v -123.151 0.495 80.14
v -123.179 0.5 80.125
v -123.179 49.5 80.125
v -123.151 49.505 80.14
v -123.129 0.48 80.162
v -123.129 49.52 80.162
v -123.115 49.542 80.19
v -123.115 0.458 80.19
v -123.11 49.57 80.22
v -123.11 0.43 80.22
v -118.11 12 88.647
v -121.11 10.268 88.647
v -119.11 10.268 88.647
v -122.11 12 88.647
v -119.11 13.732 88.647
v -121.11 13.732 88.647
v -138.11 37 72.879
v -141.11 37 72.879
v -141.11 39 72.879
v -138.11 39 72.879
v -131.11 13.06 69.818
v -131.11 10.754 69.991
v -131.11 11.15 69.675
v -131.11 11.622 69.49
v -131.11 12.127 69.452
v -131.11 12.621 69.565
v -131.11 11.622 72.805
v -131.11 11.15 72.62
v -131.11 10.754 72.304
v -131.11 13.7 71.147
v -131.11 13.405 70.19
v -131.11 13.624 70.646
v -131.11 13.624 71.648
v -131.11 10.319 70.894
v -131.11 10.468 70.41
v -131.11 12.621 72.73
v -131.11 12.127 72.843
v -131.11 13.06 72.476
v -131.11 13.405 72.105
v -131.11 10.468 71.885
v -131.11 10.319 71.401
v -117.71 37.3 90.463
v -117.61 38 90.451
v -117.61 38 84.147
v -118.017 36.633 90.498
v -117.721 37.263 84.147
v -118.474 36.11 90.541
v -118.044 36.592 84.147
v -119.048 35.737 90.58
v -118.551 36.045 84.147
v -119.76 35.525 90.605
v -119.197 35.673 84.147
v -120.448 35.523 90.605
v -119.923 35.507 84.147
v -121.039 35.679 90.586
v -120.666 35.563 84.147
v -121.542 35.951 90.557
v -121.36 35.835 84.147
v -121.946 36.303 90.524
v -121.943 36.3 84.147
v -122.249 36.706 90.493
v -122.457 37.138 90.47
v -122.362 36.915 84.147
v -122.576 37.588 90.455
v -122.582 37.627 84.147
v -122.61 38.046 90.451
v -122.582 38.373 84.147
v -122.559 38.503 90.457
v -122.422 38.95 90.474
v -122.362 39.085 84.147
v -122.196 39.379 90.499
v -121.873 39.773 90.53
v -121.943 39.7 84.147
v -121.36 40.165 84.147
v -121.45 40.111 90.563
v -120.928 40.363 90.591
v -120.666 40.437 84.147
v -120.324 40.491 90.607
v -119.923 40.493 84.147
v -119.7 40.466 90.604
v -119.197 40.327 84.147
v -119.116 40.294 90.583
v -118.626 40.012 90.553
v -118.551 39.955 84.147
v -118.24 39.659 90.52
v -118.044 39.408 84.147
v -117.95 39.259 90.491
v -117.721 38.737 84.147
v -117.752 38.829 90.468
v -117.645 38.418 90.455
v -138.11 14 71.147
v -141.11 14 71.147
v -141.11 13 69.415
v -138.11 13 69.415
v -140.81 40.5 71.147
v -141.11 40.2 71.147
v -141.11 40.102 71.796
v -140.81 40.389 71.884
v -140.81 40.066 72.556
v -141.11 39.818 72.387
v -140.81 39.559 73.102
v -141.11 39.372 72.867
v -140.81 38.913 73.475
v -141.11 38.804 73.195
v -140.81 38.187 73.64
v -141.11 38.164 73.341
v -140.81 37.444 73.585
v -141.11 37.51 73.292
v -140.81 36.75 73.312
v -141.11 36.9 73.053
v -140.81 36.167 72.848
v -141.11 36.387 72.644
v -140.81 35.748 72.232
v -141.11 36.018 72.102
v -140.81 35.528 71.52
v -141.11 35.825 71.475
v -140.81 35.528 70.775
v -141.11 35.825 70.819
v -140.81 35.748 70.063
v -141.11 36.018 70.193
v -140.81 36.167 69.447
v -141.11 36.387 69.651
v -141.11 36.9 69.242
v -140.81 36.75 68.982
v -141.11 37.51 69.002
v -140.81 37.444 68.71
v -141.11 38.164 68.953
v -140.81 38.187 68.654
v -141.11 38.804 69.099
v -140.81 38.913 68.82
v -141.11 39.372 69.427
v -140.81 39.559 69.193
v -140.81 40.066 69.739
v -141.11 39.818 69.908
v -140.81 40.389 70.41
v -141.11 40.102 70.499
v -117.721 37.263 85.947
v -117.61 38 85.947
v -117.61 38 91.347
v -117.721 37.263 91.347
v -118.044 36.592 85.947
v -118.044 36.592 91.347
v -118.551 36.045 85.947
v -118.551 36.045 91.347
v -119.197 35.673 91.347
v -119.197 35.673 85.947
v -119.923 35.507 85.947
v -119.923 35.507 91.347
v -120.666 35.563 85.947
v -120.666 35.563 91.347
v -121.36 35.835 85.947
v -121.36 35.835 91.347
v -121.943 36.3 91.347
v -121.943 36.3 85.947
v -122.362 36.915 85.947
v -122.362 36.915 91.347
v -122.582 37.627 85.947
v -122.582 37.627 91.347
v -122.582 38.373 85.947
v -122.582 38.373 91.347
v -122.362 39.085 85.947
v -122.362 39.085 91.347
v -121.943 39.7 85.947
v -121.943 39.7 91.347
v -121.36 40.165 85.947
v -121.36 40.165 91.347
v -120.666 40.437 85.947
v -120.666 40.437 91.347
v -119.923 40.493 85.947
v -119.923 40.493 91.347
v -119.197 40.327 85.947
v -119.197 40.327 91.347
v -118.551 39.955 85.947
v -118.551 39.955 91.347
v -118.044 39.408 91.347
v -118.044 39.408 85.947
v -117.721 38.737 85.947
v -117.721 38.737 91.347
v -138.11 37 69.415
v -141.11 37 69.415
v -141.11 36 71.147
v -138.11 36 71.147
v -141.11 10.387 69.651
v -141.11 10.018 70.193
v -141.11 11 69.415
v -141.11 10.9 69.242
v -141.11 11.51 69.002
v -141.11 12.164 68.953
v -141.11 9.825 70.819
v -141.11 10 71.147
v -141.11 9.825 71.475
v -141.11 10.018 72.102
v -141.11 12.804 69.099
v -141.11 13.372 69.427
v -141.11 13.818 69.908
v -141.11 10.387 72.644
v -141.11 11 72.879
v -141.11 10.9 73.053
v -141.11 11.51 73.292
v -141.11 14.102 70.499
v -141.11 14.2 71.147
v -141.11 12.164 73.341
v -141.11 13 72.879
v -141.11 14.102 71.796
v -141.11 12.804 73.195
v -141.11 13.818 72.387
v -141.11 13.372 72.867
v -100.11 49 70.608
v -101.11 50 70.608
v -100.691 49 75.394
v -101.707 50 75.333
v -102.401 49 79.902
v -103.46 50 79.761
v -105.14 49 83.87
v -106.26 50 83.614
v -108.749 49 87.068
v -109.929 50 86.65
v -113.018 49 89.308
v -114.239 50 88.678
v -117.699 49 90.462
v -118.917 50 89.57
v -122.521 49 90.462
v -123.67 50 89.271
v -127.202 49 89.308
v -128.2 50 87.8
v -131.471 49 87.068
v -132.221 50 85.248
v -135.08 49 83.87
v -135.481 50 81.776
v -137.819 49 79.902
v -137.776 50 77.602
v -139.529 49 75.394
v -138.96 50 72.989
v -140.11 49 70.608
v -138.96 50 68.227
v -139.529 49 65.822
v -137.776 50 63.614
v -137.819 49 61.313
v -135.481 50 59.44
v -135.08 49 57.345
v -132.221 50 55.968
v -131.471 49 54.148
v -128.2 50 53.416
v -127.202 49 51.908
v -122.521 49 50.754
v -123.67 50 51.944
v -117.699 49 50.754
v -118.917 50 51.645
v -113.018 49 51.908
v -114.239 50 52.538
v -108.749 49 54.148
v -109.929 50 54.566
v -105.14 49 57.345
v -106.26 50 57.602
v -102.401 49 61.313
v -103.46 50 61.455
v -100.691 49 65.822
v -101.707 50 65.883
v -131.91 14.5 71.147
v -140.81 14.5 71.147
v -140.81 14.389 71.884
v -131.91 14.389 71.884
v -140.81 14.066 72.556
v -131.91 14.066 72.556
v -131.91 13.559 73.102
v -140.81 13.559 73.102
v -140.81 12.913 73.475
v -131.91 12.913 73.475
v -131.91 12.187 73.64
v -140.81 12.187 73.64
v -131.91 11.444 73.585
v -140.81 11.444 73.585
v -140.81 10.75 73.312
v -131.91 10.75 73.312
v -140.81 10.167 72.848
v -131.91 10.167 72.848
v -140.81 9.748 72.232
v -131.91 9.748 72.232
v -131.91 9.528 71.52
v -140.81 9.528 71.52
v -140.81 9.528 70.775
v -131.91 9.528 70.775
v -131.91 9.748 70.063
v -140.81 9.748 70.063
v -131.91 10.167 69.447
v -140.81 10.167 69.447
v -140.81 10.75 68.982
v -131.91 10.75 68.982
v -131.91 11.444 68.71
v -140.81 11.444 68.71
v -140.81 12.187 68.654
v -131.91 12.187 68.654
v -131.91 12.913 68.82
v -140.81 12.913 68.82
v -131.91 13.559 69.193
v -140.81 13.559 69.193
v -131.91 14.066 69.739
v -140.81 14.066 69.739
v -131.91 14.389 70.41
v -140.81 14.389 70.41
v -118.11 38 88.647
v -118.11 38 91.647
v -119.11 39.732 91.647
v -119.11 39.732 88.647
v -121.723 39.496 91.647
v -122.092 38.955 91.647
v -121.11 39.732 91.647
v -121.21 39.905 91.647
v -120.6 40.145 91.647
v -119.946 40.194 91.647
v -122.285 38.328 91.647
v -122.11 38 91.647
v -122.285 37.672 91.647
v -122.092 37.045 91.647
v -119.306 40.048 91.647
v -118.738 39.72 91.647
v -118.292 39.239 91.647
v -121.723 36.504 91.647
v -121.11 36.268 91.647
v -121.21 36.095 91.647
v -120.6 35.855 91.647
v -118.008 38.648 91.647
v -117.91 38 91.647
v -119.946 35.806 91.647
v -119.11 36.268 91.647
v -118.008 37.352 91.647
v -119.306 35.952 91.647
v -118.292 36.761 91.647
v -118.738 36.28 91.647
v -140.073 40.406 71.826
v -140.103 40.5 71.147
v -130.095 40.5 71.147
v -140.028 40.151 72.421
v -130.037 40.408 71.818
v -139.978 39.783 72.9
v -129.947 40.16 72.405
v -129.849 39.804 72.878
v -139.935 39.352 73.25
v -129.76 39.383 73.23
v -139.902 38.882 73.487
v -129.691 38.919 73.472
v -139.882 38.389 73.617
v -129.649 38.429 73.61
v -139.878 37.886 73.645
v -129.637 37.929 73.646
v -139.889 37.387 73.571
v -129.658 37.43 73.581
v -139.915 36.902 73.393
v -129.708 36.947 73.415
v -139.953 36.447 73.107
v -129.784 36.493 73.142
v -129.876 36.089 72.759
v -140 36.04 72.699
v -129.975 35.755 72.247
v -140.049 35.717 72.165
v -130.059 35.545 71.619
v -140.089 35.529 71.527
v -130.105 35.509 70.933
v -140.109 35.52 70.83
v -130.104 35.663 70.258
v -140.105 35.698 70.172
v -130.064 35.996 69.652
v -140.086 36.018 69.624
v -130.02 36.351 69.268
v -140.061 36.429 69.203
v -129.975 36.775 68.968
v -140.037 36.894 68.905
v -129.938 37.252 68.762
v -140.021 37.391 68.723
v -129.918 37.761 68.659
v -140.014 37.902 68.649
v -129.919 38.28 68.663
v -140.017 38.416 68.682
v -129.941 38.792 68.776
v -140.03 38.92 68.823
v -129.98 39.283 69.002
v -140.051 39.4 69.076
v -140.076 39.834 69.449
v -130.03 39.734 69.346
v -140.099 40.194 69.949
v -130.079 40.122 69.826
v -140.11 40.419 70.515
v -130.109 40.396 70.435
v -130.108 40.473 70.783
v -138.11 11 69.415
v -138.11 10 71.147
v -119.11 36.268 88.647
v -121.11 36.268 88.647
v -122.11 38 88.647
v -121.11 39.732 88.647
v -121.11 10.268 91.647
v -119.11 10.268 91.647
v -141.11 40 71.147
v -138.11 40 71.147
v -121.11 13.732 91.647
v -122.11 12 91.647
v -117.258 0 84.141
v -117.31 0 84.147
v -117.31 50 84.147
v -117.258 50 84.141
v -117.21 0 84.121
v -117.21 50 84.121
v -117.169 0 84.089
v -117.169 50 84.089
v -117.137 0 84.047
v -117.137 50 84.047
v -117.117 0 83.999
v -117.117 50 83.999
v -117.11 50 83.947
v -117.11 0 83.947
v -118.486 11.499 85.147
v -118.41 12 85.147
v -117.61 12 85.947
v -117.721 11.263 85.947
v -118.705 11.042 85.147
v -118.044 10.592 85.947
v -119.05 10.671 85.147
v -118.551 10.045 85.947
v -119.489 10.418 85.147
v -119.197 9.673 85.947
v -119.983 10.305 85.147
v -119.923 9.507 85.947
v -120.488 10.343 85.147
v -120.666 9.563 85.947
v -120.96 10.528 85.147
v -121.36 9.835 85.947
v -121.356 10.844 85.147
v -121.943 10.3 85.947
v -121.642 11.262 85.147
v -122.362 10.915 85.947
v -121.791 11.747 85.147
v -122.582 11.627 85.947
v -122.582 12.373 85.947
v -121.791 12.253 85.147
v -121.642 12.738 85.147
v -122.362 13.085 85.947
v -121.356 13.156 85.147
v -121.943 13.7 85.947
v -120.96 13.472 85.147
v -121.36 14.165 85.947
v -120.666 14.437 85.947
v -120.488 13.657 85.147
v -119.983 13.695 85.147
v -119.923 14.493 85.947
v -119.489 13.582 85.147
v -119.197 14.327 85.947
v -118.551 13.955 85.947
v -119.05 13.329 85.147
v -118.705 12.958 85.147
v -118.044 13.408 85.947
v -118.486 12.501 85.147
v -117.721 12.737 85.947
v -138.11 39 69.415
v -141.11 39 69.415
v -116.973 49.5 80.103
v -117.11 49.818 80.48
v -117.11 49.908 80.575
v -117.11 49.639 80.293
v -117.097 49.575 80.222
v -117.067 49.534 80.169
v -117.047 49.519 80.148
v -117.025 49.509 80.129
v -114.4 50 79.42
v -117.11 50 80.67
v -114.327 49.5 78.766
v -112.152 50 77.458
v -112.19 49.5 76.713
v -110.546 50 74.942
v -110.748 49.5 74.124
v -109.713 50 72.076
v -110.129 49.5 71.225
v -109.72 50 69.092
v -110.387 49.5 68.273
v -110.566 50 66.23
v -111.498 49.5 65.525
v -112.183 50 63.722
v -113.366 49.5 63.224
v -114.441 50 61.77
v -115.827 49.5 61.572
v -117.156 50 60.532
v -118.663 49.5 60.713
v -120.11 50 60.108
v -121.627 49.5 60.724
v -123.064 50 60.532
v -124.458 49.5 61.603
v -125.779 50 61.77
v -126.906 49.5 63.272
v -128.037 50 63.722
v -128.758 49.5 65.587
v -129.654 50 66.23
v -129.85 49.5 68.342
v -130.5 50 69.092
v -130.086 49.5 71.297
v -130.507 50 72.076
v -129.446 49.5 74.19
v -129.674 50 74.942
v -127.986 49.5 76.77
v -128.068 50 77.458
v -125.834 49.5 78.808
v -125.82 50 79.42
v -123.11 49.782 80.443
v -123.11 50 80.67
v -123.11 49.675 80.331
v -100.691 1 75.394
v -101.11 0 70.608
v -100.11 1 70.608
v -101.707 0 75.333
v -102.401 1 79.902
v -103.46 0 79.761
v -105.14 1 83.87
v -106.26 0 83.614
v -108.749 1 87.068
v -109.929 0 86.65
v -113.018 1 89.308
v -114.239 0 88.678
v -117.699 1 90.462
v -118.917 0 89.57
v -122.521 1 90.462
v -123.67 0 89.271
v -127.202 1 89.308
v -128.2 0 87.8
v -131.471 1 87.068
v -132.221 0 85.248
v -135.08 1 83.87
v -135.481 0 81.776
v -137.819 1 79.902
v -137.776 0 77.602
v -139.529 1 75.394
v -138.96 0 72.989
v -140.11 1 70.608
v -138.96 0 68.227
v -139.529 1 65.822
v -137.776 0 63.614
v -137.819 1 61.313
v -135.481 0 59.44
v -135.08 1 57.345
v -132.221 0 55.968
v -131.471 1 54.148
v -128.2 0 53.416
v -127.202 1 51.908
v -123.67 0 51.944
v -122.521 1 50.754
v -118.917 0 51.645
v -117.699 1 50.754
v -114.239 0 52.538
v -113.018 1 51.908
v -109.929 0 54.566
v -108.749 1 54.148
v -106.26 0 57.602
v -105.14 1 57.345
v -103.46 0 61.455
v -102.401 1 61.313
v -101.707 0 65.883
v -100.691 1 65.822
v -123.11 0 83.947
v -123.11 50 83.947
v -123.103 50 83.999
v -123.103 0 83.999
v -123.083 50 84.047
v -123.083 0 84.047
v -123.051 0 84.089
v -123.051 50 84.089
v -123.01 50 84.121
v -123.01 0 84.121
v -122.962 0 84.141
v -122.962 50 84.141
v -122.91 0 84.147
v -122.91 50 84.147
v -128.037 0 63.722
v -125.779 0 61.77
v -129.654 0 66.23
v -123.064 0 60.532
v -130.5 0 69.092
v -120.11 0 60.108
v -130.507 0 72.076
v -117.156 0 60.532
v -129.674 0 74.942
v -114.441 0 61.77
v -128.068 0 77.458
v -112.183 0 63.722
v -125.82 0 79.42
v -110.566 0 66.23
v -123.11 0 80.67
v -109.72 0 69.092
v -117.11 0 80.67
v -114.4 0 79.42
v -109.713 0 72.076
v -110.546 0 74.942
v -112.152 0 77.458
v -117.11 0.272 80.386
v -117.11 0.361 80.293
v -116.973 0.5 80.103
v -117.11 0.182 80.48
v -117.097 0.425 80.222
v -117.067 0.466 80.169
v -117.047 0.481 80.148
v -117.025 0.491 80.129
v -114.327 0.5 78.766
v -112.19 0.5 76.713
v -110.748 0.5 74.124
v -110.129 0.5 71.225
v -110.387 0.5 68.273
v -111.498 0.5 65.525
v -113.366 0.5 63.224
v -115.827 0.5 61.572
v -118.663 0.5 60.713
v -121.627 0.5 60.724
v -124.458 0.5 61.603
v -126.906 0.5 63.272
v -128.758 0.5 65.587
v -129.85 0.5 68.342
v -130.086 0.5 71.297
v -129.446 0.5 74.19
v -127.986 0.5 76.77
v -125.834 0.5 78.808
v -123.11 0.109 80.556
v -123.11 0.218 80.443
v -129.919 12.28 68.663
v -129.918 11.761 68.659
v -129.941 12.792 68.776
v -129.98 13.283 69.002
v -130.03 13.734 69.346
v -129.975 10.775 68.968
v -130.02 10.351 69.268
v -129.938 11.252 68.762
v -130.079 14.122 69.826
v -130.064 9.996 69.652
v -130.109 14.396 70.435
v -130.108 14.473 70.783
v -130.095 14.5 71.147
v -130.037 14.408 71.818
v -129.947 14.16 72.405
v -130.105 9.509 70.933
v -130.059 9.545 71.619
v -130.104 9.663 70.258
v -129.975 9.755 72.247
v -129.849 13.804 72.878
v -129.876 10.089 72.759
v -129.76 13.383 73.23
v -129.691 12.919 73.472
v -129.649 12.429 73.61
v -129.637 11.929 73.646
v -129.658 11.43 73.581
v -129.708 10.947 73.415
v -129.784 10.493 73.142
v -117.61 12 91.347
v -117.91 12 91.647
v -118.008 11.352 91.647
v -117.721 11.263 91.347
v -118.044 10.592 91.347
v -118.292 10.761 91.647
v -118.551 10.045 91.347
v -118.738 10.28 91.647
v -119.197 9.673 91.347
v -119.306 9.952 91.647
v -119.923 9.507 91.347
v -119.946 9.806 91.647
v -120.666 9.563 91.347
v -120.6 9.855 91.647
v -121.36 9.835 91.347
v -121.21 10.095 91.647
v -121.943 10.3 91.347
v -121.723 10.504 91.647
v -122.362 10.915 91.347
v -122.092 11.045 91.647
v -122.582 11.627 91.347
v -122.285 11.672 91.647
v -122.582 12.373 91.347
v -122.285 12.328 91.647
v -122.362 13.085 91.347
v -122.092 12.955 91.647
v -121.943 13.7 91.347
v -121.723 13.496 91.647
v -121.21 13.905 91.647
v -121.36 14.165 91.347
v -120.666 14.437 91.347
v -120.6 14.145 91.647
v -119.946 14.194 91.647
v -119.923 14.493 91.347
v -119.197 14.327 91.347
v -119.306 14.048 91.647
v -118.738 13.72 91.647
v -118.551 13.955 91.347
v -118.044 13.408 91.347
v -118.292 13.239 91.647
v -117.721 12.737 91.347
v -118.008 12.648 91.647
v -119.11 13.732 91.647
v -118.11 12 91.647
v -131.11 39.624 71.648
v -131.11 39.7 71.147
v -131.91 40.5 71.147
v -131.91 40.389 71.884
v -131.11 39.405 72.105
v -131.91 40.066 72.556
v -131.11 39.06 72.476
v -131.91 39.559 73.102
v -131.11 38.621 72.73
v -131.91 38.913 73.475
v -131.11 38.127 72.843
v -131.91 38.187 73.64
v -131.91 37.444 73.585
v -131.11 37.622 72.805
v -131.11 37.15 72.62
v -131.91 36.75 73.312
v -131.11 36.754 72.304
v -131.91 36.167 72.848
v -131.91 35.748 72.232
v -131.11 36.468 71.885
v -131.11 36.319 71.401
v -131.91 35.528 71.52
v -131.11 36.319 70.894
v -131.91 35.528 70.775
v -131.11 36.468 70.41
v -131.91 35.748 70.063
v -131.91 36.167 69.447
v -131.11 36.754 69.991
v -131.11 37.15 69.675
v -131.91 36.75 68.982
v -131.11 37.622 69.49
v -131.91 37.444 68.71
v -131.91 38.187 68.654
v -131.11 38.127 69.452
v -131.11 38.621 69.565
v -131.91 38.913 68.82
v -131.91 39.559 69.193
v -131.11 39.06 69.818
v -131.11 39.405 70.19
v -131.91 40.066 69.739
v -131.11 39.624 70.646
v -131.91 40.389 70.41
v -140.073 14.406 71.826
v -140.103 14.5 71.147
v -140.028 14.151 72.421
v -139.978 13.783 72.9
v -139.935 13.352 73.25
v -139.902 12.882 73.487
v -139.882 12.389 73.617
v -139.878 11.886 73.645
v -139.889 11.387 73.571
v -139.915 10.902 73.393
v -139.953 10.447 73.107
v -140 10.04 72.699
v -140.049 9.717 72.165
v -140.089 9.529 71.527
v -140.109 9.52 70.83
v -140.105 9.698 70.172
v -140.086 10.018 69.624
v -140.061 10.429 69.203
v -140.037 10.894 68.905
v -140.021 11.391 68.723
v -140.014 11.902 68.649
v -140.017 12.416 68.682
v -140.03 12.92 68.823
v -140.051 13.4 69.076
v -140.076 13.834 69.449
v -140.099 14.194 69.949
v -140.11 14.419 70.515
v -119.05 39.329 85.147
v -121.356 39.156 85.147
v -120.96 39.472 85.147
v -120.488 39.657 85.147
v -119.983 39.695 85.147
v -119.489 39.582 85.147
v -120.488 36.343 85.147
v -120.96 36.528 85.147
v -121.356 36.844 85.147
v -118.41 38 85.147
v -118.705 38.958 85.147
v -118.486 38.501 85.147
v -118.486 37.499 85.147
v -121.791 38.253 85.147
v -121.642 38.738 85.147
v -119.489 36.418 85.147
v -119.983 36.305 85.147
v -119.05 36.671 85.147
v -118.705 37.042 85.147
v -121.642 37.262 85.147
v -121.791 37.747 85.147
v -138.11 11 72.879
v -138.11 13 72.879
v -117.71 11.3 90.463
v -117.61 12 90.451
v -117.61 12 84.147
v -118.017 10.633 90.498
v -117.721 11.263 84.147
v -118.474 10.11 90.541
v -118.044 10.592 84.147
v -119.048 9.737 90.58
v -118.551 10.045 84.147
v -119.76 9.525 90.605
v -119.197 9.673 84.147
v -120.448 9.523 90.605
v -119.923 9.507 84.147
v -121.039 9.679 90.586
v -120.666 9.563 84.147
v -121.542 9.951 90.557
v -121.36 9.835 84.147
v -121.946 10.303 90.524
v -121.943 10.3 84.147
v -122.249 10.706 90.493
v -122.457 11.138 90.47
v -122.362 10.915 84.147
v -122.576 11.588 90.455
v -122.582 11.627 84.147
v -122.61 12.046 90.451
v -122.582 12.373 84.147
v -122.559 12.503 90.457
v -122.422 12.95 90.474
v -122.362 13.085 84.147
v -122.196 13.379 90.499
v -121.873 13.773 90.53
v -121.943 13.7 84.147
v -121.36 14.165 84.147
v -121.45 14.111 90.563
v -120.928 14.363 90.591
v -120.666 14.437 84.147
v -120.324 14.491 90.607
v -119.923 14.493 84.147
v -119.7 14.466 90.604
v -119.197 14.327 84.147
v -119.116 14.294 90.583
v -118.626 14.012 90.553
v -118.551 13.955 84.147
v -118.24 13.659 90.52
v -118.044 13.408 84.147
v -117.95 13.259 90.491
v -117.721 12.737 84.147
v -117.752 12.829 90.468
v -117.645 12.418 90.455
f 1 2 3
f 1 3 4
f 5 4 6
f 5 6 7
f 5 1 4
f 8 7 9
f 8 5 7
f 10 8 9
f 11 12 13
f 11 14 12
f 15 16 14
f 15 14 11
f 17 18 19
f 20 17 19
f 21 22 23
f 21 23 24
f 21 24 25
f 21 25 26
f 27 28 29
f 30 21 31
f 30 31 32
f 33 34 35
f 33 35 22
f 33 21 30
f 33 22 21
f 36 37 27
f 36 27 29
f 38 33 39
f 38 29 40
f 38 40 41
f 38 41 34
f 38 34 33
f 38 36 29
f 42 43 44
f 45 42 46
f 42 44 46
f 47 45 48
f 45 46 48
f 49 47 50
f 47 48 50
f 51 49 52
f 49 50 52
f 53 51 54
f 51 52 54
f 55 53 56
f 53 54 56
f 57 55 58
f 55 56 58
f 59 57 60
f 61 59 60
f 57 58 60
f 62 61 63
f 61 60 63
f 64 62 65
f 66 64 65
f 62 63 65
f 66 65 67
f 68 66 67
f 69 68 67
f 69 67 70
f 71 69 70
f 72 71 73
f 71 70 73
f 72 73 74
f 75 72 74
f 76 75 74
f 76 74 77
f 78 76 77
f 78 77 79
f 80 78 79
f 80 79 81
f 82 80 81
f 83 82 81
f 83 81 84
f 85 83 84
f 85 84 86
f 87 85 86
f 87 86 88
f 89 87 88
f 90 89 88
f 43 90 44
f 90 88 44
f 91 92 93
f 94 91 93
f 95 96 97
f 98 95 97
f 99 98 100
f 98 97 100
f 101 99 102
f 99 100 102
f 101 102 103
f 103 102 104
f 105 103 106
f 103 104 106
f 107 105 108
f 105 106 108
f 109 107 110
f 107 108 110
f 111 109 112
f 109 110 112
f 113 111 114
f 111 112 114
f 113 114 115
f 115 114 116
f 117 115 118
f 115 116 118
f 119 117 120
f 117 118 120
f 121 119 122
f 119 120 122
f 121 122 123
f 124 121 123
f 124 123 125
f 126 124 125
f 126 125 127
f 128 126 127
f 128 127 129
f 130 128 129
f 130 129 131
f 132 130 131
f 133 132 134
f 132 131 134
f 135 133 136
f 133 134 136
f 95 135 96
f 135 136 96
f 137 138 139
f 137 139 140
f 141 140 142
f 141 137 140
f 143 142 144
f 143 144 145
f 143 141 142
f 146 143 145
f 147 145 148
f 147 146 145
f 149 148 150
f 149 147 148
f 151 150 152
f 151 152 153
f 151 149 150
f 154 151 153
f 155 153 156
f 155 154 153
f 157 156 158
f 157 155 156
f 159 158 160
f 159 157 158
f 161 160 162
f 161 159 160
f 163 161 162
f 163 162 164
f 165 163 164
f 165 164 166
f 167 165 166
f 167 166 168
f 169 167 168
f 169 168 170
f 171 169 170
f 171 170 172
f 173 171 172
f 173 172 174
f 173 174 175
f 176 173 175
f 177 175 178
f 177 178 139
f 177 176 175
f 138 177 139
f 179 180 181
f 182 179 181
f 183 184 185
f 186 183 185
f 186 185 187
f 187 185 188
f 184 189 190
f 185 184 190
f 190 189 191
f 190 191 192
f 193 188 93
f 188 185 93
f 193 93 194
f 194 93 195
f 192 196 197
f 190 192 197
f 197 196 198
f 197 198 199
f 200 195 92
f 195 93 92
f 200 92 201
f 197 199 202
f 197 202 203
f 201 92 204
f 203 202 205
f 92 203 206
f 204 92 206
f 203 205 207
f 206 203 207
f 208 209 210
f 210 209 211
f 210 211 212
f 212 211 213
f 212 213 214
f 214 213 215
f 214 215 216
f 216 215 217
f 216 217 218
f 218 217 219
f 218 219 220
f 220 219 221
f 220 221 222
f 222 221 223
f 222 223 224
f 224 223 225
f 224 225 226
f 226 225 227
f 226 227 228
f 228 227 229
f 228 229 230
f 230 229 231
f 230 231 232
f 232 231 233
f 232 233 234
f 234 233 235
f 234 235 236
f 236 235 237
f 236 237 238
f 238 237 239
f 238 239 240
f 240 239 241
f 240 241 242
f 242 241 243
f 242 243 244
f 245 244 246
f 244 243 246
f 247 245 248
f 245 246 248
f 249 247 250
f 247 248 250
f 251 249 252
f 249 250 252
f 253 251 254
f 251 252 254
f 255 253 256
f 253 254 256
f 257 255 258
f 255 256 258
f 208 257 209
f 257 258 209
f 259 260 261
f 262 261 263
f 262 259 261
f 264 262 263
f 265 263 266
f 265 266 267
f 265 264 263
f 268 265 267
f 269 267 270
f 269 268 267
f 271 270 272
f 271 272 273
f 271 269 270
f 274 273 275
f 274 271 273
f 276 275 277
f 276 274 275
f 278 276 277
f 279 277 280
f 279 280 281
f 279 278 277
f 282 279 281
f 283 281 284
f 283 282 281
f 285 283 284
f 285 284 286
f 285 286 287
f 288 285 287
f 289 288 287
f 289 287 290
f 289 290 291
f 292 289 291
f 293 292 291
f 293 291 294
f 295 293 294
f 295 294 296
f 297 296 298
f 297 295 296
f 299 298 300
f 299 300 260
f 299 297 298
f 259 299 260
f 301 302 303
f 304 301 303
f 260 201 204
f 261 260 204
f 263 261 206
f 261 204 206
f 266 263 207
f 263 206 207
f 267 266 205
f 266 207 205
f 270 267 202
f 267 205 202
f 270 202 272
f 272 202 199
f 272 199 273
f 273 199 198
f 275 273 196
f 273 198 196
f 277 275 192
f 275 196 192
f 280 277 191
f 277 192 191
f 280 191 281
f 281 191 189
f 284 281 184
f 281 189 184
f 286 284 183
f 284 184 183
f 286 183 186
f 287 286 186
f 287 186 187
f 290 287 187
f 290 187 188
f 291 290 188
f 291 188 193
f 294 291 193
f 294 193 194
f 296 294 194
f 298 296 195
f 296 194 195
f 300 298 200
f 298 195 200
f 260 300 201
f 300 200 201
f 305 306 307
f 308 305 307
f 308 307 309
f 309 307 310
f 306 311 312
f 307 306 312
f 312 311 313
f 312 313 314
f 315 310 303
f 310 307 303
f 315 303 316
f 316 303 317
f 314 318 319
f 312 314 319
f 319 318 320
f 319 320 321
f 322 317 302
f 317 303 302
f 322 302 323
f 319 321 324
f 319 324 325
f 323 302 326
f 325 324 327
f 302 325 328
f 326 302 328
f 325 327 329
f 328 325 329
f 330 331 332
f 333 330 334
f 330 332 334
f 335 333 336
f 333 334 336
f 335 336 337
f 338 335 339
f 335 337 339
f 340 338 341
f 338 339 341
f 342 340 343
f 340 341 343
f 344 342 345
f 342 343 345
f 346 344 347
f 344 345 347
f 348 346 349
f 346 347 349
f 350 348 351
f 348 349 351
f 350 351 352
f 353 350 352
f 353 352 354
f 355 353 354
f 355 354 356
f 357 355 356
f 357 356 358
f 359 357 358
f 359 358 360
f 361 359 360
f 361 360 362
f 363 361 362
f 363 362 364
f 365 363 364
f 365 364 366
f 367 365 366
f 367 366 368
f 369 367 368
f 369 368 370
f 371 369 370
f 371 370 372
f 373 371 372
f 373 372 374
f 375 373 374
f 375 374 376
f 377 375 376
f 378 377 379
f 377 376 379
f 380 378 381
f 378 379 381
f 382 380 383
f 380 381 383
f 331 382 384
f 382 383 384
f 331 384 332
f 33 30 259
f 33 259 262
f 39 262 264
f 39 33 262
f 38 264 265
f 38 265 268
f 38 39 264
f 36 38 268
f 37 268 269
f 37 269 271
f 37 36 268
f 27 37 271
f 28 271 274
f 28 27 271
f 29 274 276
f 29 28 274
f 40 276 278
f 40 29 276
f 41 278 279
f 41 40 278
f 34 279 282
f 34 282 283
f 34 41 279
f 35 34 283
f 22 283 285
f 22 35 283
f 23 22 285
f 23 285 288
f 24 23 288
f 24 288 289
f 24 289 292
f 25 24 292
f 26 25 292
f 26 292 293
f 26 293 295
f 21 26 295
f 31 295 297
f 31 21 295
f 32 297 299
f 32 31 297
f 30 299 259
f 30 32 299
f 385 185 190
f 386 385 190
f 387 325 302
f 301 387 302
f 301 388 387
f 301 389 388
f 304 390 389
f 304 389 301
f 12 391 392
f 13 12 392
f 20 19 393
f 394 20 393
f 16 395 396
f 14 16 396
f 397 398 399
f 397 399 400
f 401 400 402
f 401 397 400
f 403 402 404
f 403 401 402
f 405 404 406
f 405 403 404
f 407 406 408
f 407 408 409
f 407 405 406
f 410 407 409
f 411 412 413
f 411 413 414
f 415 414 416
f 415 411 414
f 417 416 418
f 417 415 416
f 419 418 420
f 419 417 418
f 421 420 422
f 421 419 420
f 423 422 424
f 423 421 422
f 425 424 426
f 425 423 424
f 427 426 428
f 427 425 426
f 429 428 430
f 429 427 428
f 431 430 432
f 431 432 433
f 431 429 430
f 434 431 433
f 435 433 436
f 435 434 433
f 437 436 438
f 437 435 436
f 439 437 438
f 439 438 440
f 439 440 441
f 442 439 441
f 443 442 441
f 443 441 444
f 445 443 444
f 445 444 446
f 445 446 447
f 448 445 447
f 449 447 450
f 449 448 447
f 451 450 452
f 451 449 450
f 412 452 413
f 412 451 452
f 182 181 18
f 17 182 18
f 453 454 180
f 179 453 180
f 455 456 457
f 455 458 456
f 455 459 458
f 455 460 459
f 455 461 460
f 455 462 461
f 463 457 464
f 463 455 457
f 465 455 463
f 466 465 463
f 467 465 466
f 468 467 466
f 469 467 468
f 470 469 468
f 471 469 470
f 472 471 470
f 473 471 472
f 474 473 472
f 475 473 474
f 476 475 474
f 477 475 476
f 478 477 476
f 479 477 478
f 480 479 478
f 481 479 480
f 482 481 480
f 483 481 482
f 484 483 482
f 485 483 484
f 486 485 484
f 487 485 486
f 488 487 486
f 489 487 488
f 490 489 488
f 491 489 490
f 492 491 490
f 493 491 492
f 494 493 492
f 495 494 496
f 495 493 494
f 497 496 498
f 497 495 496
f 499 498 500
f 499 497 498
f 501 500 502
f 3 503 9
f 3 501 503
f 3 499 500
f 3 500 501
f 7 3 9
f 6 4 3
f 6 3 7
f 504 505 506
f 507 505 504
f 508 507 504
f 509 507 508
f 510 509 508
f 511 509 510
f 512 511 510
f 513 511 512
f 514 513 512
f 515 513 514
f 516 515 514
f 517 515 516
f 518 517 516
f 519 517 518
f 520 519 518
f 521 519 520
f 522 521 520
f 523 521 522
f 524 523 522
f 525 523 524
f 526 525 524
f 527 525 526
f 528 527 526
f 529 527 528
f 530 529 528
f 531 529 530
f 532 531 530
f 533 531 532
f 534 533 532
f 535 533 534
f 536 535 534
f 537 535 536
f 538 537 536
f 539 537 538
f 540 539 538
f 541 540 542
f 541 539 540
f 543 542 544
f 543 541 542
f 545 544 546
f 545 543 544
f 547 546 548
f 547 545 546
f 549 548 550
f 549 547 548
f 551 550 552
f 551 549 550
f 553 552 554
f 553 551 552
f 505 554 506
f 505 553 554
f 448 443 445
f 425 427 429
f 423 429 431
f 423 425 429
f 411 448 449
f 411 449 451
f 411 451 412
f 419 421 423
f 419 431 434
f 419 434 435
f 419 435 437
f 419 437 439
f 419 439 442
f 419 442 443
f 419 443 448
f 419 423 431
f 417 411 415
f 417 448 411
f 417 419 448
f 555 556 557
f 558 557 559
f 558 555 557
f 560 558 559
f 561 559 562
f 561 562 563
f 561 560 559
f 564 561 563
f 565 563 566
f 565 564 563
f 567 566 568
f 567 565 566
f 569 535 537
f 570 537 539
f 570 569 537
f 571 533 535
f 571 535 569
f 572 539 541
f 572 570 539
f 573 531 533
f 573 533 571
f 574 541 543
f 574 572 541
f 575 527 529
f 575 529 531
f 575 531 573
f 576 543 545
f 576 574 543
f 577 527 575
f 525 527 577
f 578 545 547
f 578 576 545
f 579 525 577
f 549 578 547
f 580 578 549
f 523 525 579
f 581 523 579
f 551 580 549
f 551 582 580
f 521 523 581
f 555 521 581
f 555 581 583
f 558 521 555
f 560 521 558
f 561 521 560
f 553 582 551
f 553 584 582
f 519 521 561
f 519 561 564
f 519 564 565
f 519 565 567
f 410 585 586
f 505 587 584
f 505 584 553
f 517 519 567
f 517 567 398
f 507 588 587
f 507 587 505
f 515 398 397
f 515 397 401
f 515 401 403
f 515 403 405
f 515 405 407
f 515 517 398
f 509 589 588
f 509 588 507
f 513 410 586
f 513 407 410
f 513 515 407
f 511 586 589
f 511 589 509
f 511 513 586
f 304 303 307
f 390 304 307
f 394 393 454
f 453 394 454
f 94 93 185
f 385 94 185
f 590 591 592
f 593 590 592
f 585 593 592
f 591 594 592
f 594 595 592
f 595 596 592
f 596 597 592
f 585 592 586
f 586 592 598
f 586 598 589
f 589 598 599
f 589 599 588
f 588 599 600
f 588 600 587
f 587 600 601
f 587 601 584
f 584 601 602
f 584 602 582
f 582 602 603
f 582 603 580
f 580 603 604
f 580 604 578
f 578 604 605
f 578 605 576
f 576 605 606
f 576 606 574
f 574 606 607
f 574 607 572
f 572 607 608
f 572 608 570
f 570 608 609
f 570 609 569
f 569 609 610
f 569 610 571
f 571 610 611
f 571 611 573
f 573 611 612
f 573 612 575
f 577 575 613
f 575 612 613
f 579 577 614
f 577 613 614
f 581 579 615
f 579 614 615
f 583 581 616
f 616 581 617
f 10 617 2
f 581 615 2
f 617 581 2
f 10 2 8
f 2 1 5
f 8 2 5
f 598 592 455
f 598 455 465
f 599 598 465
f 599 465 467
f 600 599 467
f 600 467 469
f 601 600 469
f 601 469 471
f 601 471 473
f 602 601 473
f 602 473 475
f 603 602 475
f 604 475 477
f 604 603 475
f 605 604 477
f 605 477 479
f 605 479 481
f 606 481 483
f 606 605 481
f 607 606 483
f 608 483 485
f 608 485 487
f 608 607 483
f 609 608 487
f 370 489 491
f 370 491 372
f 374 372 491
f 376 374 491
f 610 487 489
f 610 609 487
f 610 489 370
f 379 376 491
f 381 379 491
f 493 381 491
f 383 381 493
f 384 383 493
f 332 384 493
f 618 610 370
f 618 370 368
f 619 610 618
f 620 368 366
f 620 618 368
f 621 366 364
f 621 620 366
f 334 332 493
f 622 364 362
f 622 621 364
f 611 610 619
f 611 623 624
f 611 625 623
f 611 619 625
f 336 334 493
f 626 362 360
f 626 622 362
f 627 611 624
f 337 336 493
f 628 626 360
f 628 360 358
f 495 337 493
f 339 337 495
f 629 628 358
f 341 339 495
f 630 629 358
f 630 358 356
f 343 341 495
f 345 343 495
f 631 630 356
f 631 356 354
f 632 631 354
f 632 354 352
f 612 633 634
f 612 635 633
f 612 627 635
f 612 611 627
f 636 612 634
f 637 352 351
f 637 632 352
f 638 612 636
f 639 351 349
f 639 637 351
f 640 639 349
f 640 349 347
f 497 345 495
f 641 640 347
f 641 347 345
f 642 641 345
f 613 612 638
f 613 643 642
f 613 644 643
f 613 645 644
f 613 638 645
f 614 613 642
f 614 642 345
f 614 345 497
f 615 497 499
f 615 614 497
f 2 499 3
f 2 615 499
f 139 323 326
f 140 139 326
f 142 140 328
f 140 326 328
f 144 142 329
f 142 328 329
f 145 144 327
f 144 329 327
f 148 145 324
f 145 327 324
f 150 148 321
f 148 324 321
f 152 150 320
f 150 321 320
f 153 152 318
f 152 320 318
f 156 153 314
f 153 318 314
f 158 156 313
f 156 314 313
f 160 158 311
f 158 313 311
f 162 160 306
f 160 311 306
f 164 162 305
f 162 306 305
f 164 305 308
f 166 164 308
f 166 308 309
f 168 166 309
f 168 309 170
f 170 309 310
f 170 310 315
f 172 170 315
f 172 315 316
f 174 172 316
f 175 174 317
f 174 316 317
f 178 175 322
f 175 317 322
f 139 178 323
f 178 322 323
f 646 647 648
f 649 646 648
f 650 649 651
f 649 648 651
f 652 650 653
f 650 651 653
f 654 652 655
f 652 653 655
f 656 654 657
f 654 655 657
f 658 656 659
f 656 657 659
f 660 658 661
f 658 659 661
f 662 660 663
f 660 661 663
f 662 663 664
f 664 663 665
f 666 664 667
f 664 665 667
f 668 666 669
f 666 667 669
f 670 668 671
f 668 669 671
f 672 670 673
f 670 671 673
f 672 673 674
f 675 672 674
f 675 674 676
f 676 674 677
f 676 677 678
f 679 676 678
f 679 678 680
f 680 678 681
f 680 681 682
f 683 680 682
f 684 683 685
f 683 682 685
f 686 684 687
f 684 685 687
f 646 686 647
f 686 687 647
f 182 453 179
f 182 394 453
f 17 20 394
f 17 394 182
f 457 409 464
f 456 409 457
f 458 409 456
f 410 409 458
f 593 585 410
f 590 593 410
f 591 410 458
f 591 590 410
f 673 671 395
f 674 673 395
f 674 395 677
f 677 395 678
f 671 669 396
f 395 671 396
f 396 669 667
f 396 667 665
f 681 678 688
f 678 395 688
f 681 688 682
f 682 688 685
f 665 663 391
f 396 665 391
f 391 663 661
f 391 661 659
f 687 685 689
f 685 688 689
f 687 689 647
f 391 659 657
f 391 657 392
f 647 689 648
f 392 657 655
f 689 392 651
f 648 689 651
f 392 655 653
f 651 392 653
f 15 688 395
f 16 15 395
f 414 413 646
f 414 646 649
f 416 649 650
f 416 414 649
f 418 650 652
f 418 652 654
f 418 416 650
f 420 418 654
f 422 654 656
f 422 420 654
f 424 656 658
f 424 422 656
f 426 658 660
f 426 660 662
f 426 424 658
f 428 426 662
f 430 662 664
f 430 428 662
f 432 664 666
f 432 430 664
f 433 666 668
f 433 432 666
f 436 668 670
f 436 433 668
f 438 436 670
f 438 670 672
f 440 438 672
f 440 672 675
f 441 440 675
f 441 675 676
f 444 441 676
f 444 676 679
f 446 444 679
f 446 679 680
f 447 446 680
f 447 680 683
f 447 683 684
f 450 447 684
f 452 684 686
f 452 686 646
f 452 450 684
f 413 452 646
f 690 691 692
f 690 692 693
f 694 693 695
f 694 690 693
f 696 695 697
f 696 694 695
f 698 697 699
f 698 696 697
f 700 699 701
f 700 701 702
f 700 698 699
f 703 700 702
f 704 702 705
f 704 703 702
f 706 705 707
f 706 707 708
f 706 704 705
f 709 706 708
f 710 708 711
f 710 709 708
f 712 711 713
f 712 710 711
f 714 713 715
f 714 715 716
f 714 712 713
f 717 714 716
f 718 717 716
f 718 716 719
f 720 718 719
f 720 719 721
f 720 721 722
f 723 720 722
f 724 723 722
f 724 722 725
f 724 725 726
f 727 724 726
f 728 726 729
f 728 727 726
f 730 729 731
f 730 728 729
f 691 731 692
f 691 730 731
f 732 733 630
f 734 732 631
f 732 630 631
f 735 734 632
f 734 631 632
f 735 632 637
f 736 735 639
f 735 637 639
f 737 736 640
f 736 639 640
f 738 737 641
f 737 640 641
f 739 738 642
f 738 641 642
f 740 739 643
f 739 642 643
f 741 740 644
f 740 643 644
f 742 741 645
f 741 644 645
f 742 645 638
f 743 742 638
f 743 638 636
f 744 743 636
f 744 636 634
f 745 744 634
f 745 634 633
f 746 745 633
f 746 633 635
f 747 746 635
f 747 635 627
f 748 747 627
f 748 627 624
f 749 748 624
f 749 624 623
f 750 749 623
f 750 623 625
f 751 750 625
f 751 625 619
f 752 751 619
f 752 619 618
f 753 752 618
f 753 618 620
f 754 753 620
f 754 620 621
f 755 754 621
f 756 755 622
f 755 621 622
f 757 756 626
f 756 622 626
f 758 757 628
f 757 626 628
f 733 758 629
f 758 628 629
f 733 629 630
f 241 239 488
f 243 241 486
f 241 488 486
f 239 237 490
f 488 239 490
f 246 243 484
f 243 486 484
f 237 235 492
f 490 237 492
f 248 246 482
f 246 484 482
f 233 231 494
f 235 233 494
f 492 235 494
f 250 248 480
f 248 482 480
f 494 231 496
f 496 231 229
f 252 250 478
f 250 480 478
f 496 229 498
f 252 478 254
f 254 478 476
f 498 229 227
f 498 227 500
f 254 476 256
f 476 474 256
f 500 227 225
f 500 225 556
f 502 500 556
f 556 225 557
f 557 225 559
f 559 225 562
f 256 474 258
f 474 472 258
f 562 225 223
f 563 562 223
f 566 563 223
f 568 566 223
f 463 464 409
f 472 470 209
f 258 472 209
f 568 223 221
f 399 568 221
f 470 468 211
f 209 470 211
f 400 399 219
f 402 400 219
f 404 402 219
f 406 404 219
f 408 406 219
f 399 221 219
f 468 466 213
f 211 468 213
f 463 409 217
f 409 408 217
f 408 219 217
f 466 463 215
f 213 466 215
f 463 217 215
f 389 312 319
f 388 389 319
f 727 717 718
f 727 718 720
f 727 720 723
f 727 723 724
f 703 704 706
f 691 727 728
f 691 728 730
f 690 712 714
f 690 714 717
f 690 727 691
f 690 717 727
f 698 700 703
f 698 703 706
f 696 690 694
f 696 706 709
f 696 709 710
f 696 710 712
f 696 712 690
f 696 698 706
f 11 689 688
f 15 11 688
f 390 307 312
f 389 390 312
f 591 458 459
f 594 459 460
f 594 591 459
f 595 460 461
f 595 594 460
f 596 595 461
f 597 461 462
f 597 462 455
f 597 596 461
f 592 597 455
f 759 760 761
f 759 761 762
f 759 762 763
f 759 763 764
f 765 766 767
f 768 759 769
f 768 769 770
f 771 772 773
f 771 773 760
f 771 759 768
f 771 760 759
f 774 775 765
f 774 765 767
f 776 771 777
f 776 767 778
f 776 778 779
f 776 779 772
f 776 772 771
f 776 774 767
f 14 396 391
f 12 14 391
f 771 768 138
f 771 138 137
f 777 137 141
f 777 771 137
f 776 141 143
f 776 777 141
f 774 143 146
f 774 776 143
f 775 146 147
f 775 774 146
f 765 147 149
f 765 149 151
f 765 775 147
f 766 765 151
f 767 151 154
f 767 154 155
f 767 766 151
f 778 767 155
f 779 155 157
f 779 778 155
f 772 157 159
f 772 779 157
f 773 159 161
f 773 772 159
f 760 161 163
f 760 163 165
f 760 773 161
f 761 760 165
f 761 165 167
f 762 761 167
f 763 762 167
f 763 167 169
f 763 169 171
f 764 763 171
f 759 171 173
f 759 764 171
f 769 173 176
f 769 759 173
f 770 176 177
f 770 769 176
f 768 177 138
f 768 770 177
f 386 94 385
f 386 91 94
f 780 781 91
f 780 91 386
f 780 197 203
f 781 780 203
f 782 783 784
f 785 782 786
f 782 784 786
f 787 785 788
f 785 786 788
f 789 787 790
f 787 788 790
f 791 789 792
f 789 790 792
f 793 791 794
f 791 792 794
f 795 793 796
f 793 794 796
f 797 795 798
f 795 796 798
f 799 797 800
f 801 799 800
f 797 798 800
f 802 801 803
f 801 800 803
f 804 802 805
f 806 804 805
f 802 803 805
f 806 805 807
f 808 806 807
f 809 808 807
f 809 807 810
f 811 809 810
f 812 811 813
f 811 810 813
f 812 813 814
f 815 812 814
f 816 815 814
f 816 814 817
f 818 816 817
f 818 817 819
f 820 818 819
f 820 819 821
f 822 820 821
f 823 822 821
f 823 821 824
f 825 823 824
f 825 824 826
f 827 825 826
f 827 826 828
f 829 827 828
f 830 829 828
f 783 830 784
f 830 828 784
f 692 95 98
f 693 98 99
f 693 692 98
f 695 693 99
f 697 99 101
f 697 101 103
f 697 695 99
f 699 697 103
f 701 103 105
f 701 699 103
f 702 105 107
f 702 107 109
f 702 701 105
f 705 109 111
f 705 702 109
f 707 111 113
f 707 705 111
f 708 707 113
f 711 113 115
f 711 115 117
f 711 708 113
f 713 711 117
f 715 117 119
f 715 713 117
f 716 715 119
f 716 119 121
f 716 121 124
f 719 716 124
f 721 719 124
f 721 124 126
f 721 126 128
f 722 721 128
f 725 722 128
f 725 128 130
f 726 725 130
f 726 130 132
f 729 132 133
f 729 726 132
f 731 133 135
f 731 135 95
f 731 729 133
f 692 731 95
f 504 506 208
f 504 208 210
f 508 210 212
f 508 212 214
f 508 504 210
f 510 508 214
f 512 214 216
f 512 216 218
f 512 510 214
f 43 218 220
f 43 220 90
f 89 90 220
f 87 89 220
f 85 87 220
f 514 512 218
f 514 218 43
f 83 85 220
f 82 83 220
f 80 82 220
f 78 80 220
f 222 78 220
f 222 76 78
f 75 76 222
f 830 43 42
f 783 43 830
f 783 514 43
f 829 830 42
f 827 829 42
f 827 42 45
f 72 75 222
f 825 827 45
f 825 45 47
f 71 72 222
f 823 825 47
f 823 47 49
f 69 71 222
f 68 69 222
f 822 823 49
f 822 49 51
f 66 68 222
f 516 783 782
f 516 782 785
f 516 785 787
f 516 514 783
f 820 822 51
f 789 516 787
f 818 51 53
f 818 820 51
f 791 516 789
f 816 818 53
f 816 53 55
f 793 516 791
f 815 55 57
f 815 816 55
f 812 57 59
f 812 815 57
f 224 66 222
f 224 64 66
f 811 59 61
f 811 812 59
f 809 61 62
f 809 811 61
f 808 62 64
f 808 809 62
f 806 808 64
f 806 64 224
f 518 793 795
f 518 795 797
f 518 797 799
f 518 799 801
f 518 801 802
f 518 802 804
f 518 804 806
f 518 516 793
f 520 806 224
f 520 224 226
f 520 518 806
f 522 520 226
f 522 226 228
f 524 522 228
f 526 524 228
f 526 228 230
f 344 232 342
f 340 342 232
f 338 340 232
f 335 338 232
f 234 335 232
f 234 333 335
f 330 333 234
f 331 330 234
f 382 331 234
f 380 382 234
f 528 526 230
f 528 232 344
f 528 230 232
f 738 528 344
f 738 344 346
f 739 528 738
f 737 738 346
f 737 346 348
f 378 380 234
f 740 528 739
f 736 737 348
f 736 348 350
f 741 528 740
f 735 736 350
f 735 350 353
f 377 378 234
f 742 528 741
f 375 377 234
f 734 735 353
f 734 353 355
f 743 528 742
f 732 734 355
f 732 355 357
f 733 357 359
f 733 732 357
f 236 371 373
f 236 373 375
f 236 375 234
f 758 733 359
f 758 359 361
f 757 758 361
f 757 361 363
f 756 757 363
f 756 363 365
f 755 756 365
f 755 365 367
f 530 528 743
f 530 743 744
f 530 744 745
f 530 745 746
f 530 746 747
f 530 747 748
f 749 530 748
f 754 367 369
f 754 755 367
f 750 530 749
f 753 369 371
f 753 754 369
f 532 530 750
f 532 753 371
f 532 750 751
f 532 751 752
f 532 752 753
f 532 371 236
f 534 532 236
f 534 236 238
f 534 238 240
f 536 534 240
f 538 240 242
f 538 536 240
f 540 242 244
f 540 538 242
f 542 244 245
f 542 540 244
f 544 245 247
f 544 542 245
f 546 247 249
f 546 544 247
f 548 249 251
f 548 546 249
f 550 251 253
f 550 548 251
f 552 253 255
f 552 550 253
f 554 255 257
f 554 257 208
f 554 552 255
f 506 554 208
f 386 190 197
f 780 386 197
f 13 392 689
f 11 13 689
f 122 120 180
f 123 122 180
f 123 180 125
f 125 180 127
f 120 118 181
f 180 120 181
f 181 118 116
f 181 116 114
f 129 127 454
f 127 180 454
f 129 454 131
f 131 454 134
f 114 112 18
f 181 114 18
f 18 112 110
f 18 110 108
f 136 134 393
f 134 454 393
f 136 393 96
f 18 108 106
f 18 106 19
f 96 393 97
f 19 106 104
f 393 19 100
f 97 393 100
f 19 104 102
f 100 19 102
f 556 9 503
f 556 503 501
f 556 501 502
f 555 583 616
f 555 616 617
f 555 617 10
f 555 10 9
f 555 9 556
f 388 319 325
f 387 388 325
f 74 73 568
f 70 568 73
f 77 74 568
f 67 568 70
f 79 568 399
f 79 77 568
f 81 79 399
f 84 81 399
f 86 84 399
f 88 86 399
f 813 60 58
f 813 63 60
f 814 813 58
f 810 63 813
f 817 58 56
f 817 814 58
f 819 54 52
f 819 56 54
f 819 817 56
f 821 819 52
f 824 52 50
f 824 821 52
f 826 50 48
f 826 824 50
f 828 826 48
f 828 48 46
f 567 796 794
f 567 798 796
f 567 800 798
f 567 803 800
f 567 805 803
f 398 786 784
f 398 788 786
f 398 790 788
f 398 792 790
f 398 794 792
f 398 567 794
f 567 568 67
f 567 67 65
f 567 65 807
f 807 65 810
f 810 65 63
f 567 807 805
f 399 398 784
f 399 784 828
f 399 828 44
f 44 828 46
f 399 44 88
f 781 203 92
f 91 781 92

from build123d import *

# Parameters (mm, degrees)
F0_R         = 20
F1_DEPTH     = 50
F2_SIZE      = 1
F3_R         = 2.5
F4_DEPTH     = 6.4616079858
F6_R         = 2.5
F7_DEPTH     = 20.0010001
F8_START     = -11
F8_DEPTH     = 10
F9_START     = -1
F9_DEPTH     = 6.5
F10_SIZE     = 0.8
F10_2_SIZE   = 0.8
F10_3_SIZE   = 0.8
F10_4_SIZE   = 0.8
F12_DEPTH    = 3
F13_SIZE     = 0.3
F13_2_SIZE   = 0.3
F13_3_SIZE   = 0.3
F13_4_SIZE   = 0.3
F15_DEPTH    = 3
F16_T2_ANGLE = 338.6533053812
F16_T4_ANGLE = 338.6533053812


# Not quite as in the source:
# - a fillet or chamfer that OpenCascade refuses, or shapes differently, is made with other operations: its cross-section is extruded or revolved along the edge and cut away or added
# - a feature names something its author has since deleted; it is built from what else it names


with BuildPart() as f1:
    # F0 (on Front) → F1 (new body)
    with BuildSketch(Plane.XZ):
        with Locations((-120.1100092272, 70.6079402205)):
            Circle(F0_R)
        with BuildLine():
            ThreePointArc((-123.1100092272, 83.9473322347), (-123.0514305834, 84.0887535909), (-122.9100092272, 84.1473322347))
            Line((-122.9100092272, 84.1473322347), (-117.3100092272, 84.1473322347))
            ThreePointArc((-117.3100092272, 84.1473322347), (-117.168587871, 84.0887535909), (-117.1100092272, 83.9473322347))
            Line((-117.1100092272, 83.9473322347), (-117.1100092272, 80.2929802308))
            ThreePointArc((-117.1100092272, 80.2929802308), (-117.0721033659, 80.1758243935), (-116.9727543252, 80.1030774855))
            ThreePointArc((-116.9727543252, 80.1030774855), (-120.1457476597, 60.6080040825), (-123.1793161579, 80.1252589062))
            ThreePointArc((-123.1793161579, 80.1252589062), (-123.1291720237, 80.161564899), (-123.1100092272, 80.2204320931))
            Line((-123.1100092272, 80.2204320931), (-123.1100092272, 83.9473322347))
        make_face(mode=Mode.SUBTRACT)
    extrude(amount=-F1_DEPTH)

    # F2
    f2_edges = [f1.edges().sort_by_distance(p)[0] for p in [
        (-140.110009, 0, 70.60794),
        (-140.110009, 50, 70.60794),
    ]]
    chamfer(f2_edges, length=F2_SIZE)

    # F3 (on face) → F4 (cut, through all)
    with BuildSketch(Plane(origin=(0, 0, 84.1473322347), x_dir=(1, 0, 0), z_dir=(0, 0, -1))):
        with Locations((-120.1100092272, -12)):
            Circle(F3_R)
        with Locations((-120.1100092272, -38)):
            Circle(F3_R)
    extrude(amount=-F4_DEPTH, mode=Mode.SUBTRACT)

    # F6 (on offset) → F7 (cut, through all)
    with BuildSketch(Plane.YZ.offset(-120.1100092272)):
        with Locations((12, 71.1473322347)):
            Circle(F6_R)
        with Locations((38, 71.1473322347)):
            Circle(F6_R)
    extrude(amount=-F7_DEPTH, mode=Mode.SUBTRACT)

    # F16: chamfer of 0.5 on 2 edges, made by hand

    # F16_s1 → F16_t2 (revolve, cut)
    with BuildSketch(Plane(origin=(-128.9179601882, 0, 24.7746190281), x_dir=(0, 1, 0), z_dir=(-0.9820308726, 0, 0.1887203358))):
        Polygon((0, -57.1719758706), (0.5, -56.6719758706), (0, -56.6719758706), align=None)
    revolve(axis=Axis((-120.1100092272, 0, 70.6079402205), (0, 1, 0)), revolution_arc=F16_T2_ANGLE, mode=Mode.SUBTRACT)

    # F16_s3 → F16_t4 (revolve, cut)
    with BuildSketch(Plane(origin=(-128.9179601882, 0, 24.7746190281), x_dir=(0, 1, 0), z_dir=(-0.9820308726, 0, 0.1887203358))):
        Polygon((50, -57.1719758706), (49.5, -56.6719758706), (50, -56.6719758706), align=None)
    revolve(axis=Axis((-120.1100092272, 50, 70.6079402205), (0, 1, 0)), revolution_arc=F16_T4_ANGLE, mode=Mode.SUBTRACT)


with BuildPart() as f8:
    # F6 (on offset) → F8 (new body)
    with BuildSketch(Plane.YZ.offset(-120.1100092272).offset(F8_START)):
        with Locations((38, 71.1473322347)):
            Circle(F6_R)
    extrude(amount=-F8_DEPTH)

    # F10
    f10_edges = [f8.edges().sort_by_distance(p)[0] for p in [
        (-131.110009, 35.5, 71.147332),
    ]]
    chamfer(f10_edges, length=F10_SIZE)

    # F13
    f13_edges = [f8.edges().sort_by_distance(p)[0] for p in [
        (-141.110009, 35.5, 71.147332),
    ]]
    chamfer(f13_edges, length=F13_SIZE)


with BuildPart() as f8b:
    # F6 (on offset) → F8, piece 2 (new body)
    with BuildSketch(Plane.YZ.offset(-120.1100092272).offset(F8_START)):
        with Locations((12, 71.1473322347)):
            Circle(F6_R)
    extrude(amount=-F8_DEPTH)

    # F10#2
    f10_2_edges = [f8b.edges().sort_by_distance(p)[0] for p in [
        (-131.110009, 9.5, 71.147332),
    ]]
    chamfer(f10_2_edges, length=F10_2_SIZE)

    # F13#2
    f13_2_edges = [f8b.edges().sort_by_distance(p)[0] for p in [
        (-141.110009, 9.5, 71.147332),
    ]]
    chamfer(f13_2_edges, length=F13_2_SIZE)


with BuildPart() as f9:
    # F3 (on face) → F9 (new body)
    with BuildSketch(Plane(origin=(0, 0, 84.1473322347), x_dir=(1, 0, 0), z_dir=(0, 0, -1)).offset(F9_START)):
        with Locations((-120.1100092272, -38)):
            Circle(F3_R)
    extrude(amount=-F9_DEPTH)

    # F10#3
    f10_3_edges = [f9.edges().sort_by_distance(p)[0] for p in [
        (-122.610009, 38, 85.147332),
    ]]
    chamfer(f10_3_edges, length=F10_3_SIZE)


with BuildPart() as f9b:
    # F3 (on face) → F9, piece 2 (new body)
    with BuildSketch(Plane(origin=(0, 0, 84.1473322347), x_dir=(1, 0, 0), z_dir=(0, 0, -1)).offset(F9_START)):
        with Locations((-120.1100092272, -12)):
            Circle(F3_R)
    extrude(amount=-F9_DEPTH)

    # F10#4
    f10_4_edges = [f9b.edges().sort_by_distance(p)[0] for p in [
        (-122.610009, 12, 85.147332),
    ]]
    chamfer(f10_4_edges, length=F10_4_SIZE)


with BuildPart() as f12_tool:
    # F11 (on face) → F12 (new body)
    with BuildSketch(Plane.XY.offset(91.6473322347)):
        Polygon((-121.1100092272, 36.2679491924), (-119.1100092272, 36.2679491924), (-118.1100092272, 38), (-119.1100092272, 39.7320508076), (-121.1100092272, 39.7320508076), (-122.1100092272, 38), align=None)
        Polygon((-121.1100092272, 10.2679491924), (-119.1100092272, 10.2679491924), (-118.1100092272, 12), (-119.1100092272, 13.7320508076), (-121.1100092272, 13.7320508076), (-122.1100092272, 12), align=None)
    extrude(amount=-F12_DEPTH)


with BuildPart() as f9_1:
    add(f9.part)

    # F12: cut by f12_tool
    add(f12_tool.part, mode=Mode.SUBTRACT)

    # F13#3
    f13_3_edges = [f9_1.edges().sort_by_distance(p)[0] for p in [
        (-122.610009, 38, 91.647332),
    ]]
    chamfer(f13_3_edges, length=F13_3_SIZE)


with BuildPart() as f9b_1:
    add(f9b.part)

    # F12: cut by f12_tool
    add(f12_tool.part, mode=Mode.SUBTRACT)

    # F13#4
    f13_4_edges = [f9b_1.edges().sort_by_distance(p)[0] for p in [
        (-122.610009, 12, 91.647332),
    ]]
    chamfer(f13_4_edges, length=F13_4_SIZE)


with BuildPart() as f15_tool:
    # F14 (on face) → F15 (new body)
    with BuildSketch(Plane(origin=(-141.1100092272, 0, 0), x_dir=(0, -1, 0), z_dir=(-1, 0, 0))):
        Polygon((-39, 69.4152814271), (-37, 69.4152814271), (-36, 71.1473322347), (-37, 72.8793830423), (-39, 72.8793830423), (-40, 71.1473322347), align=None)
        Polygon((-13, 69.4152814271), (-11, 69.4152814271), (-10, 71.1473322347), (-11, 72.8793830423), (-13, 72.8793830423), (-14, 71.1473322347), align=None)
    extrude(amount=-F15_DEPTH)


with BuildPart() as f8_1:
    add(f8.part)

    # F15: cut by f15_tool
    add(f15_tool.part, mode=Mode.SUBTRACT)


with BuildPart() as f8b_1:
    add(f8b.part)

    # F15: cut by f15_tool
    add(f15_tool.part, mode=Mode.SUBTRACT)


solid = Compound([f1.part, f9_1.part, f9b_1.part, f8_1.part, f8b_1.part])
